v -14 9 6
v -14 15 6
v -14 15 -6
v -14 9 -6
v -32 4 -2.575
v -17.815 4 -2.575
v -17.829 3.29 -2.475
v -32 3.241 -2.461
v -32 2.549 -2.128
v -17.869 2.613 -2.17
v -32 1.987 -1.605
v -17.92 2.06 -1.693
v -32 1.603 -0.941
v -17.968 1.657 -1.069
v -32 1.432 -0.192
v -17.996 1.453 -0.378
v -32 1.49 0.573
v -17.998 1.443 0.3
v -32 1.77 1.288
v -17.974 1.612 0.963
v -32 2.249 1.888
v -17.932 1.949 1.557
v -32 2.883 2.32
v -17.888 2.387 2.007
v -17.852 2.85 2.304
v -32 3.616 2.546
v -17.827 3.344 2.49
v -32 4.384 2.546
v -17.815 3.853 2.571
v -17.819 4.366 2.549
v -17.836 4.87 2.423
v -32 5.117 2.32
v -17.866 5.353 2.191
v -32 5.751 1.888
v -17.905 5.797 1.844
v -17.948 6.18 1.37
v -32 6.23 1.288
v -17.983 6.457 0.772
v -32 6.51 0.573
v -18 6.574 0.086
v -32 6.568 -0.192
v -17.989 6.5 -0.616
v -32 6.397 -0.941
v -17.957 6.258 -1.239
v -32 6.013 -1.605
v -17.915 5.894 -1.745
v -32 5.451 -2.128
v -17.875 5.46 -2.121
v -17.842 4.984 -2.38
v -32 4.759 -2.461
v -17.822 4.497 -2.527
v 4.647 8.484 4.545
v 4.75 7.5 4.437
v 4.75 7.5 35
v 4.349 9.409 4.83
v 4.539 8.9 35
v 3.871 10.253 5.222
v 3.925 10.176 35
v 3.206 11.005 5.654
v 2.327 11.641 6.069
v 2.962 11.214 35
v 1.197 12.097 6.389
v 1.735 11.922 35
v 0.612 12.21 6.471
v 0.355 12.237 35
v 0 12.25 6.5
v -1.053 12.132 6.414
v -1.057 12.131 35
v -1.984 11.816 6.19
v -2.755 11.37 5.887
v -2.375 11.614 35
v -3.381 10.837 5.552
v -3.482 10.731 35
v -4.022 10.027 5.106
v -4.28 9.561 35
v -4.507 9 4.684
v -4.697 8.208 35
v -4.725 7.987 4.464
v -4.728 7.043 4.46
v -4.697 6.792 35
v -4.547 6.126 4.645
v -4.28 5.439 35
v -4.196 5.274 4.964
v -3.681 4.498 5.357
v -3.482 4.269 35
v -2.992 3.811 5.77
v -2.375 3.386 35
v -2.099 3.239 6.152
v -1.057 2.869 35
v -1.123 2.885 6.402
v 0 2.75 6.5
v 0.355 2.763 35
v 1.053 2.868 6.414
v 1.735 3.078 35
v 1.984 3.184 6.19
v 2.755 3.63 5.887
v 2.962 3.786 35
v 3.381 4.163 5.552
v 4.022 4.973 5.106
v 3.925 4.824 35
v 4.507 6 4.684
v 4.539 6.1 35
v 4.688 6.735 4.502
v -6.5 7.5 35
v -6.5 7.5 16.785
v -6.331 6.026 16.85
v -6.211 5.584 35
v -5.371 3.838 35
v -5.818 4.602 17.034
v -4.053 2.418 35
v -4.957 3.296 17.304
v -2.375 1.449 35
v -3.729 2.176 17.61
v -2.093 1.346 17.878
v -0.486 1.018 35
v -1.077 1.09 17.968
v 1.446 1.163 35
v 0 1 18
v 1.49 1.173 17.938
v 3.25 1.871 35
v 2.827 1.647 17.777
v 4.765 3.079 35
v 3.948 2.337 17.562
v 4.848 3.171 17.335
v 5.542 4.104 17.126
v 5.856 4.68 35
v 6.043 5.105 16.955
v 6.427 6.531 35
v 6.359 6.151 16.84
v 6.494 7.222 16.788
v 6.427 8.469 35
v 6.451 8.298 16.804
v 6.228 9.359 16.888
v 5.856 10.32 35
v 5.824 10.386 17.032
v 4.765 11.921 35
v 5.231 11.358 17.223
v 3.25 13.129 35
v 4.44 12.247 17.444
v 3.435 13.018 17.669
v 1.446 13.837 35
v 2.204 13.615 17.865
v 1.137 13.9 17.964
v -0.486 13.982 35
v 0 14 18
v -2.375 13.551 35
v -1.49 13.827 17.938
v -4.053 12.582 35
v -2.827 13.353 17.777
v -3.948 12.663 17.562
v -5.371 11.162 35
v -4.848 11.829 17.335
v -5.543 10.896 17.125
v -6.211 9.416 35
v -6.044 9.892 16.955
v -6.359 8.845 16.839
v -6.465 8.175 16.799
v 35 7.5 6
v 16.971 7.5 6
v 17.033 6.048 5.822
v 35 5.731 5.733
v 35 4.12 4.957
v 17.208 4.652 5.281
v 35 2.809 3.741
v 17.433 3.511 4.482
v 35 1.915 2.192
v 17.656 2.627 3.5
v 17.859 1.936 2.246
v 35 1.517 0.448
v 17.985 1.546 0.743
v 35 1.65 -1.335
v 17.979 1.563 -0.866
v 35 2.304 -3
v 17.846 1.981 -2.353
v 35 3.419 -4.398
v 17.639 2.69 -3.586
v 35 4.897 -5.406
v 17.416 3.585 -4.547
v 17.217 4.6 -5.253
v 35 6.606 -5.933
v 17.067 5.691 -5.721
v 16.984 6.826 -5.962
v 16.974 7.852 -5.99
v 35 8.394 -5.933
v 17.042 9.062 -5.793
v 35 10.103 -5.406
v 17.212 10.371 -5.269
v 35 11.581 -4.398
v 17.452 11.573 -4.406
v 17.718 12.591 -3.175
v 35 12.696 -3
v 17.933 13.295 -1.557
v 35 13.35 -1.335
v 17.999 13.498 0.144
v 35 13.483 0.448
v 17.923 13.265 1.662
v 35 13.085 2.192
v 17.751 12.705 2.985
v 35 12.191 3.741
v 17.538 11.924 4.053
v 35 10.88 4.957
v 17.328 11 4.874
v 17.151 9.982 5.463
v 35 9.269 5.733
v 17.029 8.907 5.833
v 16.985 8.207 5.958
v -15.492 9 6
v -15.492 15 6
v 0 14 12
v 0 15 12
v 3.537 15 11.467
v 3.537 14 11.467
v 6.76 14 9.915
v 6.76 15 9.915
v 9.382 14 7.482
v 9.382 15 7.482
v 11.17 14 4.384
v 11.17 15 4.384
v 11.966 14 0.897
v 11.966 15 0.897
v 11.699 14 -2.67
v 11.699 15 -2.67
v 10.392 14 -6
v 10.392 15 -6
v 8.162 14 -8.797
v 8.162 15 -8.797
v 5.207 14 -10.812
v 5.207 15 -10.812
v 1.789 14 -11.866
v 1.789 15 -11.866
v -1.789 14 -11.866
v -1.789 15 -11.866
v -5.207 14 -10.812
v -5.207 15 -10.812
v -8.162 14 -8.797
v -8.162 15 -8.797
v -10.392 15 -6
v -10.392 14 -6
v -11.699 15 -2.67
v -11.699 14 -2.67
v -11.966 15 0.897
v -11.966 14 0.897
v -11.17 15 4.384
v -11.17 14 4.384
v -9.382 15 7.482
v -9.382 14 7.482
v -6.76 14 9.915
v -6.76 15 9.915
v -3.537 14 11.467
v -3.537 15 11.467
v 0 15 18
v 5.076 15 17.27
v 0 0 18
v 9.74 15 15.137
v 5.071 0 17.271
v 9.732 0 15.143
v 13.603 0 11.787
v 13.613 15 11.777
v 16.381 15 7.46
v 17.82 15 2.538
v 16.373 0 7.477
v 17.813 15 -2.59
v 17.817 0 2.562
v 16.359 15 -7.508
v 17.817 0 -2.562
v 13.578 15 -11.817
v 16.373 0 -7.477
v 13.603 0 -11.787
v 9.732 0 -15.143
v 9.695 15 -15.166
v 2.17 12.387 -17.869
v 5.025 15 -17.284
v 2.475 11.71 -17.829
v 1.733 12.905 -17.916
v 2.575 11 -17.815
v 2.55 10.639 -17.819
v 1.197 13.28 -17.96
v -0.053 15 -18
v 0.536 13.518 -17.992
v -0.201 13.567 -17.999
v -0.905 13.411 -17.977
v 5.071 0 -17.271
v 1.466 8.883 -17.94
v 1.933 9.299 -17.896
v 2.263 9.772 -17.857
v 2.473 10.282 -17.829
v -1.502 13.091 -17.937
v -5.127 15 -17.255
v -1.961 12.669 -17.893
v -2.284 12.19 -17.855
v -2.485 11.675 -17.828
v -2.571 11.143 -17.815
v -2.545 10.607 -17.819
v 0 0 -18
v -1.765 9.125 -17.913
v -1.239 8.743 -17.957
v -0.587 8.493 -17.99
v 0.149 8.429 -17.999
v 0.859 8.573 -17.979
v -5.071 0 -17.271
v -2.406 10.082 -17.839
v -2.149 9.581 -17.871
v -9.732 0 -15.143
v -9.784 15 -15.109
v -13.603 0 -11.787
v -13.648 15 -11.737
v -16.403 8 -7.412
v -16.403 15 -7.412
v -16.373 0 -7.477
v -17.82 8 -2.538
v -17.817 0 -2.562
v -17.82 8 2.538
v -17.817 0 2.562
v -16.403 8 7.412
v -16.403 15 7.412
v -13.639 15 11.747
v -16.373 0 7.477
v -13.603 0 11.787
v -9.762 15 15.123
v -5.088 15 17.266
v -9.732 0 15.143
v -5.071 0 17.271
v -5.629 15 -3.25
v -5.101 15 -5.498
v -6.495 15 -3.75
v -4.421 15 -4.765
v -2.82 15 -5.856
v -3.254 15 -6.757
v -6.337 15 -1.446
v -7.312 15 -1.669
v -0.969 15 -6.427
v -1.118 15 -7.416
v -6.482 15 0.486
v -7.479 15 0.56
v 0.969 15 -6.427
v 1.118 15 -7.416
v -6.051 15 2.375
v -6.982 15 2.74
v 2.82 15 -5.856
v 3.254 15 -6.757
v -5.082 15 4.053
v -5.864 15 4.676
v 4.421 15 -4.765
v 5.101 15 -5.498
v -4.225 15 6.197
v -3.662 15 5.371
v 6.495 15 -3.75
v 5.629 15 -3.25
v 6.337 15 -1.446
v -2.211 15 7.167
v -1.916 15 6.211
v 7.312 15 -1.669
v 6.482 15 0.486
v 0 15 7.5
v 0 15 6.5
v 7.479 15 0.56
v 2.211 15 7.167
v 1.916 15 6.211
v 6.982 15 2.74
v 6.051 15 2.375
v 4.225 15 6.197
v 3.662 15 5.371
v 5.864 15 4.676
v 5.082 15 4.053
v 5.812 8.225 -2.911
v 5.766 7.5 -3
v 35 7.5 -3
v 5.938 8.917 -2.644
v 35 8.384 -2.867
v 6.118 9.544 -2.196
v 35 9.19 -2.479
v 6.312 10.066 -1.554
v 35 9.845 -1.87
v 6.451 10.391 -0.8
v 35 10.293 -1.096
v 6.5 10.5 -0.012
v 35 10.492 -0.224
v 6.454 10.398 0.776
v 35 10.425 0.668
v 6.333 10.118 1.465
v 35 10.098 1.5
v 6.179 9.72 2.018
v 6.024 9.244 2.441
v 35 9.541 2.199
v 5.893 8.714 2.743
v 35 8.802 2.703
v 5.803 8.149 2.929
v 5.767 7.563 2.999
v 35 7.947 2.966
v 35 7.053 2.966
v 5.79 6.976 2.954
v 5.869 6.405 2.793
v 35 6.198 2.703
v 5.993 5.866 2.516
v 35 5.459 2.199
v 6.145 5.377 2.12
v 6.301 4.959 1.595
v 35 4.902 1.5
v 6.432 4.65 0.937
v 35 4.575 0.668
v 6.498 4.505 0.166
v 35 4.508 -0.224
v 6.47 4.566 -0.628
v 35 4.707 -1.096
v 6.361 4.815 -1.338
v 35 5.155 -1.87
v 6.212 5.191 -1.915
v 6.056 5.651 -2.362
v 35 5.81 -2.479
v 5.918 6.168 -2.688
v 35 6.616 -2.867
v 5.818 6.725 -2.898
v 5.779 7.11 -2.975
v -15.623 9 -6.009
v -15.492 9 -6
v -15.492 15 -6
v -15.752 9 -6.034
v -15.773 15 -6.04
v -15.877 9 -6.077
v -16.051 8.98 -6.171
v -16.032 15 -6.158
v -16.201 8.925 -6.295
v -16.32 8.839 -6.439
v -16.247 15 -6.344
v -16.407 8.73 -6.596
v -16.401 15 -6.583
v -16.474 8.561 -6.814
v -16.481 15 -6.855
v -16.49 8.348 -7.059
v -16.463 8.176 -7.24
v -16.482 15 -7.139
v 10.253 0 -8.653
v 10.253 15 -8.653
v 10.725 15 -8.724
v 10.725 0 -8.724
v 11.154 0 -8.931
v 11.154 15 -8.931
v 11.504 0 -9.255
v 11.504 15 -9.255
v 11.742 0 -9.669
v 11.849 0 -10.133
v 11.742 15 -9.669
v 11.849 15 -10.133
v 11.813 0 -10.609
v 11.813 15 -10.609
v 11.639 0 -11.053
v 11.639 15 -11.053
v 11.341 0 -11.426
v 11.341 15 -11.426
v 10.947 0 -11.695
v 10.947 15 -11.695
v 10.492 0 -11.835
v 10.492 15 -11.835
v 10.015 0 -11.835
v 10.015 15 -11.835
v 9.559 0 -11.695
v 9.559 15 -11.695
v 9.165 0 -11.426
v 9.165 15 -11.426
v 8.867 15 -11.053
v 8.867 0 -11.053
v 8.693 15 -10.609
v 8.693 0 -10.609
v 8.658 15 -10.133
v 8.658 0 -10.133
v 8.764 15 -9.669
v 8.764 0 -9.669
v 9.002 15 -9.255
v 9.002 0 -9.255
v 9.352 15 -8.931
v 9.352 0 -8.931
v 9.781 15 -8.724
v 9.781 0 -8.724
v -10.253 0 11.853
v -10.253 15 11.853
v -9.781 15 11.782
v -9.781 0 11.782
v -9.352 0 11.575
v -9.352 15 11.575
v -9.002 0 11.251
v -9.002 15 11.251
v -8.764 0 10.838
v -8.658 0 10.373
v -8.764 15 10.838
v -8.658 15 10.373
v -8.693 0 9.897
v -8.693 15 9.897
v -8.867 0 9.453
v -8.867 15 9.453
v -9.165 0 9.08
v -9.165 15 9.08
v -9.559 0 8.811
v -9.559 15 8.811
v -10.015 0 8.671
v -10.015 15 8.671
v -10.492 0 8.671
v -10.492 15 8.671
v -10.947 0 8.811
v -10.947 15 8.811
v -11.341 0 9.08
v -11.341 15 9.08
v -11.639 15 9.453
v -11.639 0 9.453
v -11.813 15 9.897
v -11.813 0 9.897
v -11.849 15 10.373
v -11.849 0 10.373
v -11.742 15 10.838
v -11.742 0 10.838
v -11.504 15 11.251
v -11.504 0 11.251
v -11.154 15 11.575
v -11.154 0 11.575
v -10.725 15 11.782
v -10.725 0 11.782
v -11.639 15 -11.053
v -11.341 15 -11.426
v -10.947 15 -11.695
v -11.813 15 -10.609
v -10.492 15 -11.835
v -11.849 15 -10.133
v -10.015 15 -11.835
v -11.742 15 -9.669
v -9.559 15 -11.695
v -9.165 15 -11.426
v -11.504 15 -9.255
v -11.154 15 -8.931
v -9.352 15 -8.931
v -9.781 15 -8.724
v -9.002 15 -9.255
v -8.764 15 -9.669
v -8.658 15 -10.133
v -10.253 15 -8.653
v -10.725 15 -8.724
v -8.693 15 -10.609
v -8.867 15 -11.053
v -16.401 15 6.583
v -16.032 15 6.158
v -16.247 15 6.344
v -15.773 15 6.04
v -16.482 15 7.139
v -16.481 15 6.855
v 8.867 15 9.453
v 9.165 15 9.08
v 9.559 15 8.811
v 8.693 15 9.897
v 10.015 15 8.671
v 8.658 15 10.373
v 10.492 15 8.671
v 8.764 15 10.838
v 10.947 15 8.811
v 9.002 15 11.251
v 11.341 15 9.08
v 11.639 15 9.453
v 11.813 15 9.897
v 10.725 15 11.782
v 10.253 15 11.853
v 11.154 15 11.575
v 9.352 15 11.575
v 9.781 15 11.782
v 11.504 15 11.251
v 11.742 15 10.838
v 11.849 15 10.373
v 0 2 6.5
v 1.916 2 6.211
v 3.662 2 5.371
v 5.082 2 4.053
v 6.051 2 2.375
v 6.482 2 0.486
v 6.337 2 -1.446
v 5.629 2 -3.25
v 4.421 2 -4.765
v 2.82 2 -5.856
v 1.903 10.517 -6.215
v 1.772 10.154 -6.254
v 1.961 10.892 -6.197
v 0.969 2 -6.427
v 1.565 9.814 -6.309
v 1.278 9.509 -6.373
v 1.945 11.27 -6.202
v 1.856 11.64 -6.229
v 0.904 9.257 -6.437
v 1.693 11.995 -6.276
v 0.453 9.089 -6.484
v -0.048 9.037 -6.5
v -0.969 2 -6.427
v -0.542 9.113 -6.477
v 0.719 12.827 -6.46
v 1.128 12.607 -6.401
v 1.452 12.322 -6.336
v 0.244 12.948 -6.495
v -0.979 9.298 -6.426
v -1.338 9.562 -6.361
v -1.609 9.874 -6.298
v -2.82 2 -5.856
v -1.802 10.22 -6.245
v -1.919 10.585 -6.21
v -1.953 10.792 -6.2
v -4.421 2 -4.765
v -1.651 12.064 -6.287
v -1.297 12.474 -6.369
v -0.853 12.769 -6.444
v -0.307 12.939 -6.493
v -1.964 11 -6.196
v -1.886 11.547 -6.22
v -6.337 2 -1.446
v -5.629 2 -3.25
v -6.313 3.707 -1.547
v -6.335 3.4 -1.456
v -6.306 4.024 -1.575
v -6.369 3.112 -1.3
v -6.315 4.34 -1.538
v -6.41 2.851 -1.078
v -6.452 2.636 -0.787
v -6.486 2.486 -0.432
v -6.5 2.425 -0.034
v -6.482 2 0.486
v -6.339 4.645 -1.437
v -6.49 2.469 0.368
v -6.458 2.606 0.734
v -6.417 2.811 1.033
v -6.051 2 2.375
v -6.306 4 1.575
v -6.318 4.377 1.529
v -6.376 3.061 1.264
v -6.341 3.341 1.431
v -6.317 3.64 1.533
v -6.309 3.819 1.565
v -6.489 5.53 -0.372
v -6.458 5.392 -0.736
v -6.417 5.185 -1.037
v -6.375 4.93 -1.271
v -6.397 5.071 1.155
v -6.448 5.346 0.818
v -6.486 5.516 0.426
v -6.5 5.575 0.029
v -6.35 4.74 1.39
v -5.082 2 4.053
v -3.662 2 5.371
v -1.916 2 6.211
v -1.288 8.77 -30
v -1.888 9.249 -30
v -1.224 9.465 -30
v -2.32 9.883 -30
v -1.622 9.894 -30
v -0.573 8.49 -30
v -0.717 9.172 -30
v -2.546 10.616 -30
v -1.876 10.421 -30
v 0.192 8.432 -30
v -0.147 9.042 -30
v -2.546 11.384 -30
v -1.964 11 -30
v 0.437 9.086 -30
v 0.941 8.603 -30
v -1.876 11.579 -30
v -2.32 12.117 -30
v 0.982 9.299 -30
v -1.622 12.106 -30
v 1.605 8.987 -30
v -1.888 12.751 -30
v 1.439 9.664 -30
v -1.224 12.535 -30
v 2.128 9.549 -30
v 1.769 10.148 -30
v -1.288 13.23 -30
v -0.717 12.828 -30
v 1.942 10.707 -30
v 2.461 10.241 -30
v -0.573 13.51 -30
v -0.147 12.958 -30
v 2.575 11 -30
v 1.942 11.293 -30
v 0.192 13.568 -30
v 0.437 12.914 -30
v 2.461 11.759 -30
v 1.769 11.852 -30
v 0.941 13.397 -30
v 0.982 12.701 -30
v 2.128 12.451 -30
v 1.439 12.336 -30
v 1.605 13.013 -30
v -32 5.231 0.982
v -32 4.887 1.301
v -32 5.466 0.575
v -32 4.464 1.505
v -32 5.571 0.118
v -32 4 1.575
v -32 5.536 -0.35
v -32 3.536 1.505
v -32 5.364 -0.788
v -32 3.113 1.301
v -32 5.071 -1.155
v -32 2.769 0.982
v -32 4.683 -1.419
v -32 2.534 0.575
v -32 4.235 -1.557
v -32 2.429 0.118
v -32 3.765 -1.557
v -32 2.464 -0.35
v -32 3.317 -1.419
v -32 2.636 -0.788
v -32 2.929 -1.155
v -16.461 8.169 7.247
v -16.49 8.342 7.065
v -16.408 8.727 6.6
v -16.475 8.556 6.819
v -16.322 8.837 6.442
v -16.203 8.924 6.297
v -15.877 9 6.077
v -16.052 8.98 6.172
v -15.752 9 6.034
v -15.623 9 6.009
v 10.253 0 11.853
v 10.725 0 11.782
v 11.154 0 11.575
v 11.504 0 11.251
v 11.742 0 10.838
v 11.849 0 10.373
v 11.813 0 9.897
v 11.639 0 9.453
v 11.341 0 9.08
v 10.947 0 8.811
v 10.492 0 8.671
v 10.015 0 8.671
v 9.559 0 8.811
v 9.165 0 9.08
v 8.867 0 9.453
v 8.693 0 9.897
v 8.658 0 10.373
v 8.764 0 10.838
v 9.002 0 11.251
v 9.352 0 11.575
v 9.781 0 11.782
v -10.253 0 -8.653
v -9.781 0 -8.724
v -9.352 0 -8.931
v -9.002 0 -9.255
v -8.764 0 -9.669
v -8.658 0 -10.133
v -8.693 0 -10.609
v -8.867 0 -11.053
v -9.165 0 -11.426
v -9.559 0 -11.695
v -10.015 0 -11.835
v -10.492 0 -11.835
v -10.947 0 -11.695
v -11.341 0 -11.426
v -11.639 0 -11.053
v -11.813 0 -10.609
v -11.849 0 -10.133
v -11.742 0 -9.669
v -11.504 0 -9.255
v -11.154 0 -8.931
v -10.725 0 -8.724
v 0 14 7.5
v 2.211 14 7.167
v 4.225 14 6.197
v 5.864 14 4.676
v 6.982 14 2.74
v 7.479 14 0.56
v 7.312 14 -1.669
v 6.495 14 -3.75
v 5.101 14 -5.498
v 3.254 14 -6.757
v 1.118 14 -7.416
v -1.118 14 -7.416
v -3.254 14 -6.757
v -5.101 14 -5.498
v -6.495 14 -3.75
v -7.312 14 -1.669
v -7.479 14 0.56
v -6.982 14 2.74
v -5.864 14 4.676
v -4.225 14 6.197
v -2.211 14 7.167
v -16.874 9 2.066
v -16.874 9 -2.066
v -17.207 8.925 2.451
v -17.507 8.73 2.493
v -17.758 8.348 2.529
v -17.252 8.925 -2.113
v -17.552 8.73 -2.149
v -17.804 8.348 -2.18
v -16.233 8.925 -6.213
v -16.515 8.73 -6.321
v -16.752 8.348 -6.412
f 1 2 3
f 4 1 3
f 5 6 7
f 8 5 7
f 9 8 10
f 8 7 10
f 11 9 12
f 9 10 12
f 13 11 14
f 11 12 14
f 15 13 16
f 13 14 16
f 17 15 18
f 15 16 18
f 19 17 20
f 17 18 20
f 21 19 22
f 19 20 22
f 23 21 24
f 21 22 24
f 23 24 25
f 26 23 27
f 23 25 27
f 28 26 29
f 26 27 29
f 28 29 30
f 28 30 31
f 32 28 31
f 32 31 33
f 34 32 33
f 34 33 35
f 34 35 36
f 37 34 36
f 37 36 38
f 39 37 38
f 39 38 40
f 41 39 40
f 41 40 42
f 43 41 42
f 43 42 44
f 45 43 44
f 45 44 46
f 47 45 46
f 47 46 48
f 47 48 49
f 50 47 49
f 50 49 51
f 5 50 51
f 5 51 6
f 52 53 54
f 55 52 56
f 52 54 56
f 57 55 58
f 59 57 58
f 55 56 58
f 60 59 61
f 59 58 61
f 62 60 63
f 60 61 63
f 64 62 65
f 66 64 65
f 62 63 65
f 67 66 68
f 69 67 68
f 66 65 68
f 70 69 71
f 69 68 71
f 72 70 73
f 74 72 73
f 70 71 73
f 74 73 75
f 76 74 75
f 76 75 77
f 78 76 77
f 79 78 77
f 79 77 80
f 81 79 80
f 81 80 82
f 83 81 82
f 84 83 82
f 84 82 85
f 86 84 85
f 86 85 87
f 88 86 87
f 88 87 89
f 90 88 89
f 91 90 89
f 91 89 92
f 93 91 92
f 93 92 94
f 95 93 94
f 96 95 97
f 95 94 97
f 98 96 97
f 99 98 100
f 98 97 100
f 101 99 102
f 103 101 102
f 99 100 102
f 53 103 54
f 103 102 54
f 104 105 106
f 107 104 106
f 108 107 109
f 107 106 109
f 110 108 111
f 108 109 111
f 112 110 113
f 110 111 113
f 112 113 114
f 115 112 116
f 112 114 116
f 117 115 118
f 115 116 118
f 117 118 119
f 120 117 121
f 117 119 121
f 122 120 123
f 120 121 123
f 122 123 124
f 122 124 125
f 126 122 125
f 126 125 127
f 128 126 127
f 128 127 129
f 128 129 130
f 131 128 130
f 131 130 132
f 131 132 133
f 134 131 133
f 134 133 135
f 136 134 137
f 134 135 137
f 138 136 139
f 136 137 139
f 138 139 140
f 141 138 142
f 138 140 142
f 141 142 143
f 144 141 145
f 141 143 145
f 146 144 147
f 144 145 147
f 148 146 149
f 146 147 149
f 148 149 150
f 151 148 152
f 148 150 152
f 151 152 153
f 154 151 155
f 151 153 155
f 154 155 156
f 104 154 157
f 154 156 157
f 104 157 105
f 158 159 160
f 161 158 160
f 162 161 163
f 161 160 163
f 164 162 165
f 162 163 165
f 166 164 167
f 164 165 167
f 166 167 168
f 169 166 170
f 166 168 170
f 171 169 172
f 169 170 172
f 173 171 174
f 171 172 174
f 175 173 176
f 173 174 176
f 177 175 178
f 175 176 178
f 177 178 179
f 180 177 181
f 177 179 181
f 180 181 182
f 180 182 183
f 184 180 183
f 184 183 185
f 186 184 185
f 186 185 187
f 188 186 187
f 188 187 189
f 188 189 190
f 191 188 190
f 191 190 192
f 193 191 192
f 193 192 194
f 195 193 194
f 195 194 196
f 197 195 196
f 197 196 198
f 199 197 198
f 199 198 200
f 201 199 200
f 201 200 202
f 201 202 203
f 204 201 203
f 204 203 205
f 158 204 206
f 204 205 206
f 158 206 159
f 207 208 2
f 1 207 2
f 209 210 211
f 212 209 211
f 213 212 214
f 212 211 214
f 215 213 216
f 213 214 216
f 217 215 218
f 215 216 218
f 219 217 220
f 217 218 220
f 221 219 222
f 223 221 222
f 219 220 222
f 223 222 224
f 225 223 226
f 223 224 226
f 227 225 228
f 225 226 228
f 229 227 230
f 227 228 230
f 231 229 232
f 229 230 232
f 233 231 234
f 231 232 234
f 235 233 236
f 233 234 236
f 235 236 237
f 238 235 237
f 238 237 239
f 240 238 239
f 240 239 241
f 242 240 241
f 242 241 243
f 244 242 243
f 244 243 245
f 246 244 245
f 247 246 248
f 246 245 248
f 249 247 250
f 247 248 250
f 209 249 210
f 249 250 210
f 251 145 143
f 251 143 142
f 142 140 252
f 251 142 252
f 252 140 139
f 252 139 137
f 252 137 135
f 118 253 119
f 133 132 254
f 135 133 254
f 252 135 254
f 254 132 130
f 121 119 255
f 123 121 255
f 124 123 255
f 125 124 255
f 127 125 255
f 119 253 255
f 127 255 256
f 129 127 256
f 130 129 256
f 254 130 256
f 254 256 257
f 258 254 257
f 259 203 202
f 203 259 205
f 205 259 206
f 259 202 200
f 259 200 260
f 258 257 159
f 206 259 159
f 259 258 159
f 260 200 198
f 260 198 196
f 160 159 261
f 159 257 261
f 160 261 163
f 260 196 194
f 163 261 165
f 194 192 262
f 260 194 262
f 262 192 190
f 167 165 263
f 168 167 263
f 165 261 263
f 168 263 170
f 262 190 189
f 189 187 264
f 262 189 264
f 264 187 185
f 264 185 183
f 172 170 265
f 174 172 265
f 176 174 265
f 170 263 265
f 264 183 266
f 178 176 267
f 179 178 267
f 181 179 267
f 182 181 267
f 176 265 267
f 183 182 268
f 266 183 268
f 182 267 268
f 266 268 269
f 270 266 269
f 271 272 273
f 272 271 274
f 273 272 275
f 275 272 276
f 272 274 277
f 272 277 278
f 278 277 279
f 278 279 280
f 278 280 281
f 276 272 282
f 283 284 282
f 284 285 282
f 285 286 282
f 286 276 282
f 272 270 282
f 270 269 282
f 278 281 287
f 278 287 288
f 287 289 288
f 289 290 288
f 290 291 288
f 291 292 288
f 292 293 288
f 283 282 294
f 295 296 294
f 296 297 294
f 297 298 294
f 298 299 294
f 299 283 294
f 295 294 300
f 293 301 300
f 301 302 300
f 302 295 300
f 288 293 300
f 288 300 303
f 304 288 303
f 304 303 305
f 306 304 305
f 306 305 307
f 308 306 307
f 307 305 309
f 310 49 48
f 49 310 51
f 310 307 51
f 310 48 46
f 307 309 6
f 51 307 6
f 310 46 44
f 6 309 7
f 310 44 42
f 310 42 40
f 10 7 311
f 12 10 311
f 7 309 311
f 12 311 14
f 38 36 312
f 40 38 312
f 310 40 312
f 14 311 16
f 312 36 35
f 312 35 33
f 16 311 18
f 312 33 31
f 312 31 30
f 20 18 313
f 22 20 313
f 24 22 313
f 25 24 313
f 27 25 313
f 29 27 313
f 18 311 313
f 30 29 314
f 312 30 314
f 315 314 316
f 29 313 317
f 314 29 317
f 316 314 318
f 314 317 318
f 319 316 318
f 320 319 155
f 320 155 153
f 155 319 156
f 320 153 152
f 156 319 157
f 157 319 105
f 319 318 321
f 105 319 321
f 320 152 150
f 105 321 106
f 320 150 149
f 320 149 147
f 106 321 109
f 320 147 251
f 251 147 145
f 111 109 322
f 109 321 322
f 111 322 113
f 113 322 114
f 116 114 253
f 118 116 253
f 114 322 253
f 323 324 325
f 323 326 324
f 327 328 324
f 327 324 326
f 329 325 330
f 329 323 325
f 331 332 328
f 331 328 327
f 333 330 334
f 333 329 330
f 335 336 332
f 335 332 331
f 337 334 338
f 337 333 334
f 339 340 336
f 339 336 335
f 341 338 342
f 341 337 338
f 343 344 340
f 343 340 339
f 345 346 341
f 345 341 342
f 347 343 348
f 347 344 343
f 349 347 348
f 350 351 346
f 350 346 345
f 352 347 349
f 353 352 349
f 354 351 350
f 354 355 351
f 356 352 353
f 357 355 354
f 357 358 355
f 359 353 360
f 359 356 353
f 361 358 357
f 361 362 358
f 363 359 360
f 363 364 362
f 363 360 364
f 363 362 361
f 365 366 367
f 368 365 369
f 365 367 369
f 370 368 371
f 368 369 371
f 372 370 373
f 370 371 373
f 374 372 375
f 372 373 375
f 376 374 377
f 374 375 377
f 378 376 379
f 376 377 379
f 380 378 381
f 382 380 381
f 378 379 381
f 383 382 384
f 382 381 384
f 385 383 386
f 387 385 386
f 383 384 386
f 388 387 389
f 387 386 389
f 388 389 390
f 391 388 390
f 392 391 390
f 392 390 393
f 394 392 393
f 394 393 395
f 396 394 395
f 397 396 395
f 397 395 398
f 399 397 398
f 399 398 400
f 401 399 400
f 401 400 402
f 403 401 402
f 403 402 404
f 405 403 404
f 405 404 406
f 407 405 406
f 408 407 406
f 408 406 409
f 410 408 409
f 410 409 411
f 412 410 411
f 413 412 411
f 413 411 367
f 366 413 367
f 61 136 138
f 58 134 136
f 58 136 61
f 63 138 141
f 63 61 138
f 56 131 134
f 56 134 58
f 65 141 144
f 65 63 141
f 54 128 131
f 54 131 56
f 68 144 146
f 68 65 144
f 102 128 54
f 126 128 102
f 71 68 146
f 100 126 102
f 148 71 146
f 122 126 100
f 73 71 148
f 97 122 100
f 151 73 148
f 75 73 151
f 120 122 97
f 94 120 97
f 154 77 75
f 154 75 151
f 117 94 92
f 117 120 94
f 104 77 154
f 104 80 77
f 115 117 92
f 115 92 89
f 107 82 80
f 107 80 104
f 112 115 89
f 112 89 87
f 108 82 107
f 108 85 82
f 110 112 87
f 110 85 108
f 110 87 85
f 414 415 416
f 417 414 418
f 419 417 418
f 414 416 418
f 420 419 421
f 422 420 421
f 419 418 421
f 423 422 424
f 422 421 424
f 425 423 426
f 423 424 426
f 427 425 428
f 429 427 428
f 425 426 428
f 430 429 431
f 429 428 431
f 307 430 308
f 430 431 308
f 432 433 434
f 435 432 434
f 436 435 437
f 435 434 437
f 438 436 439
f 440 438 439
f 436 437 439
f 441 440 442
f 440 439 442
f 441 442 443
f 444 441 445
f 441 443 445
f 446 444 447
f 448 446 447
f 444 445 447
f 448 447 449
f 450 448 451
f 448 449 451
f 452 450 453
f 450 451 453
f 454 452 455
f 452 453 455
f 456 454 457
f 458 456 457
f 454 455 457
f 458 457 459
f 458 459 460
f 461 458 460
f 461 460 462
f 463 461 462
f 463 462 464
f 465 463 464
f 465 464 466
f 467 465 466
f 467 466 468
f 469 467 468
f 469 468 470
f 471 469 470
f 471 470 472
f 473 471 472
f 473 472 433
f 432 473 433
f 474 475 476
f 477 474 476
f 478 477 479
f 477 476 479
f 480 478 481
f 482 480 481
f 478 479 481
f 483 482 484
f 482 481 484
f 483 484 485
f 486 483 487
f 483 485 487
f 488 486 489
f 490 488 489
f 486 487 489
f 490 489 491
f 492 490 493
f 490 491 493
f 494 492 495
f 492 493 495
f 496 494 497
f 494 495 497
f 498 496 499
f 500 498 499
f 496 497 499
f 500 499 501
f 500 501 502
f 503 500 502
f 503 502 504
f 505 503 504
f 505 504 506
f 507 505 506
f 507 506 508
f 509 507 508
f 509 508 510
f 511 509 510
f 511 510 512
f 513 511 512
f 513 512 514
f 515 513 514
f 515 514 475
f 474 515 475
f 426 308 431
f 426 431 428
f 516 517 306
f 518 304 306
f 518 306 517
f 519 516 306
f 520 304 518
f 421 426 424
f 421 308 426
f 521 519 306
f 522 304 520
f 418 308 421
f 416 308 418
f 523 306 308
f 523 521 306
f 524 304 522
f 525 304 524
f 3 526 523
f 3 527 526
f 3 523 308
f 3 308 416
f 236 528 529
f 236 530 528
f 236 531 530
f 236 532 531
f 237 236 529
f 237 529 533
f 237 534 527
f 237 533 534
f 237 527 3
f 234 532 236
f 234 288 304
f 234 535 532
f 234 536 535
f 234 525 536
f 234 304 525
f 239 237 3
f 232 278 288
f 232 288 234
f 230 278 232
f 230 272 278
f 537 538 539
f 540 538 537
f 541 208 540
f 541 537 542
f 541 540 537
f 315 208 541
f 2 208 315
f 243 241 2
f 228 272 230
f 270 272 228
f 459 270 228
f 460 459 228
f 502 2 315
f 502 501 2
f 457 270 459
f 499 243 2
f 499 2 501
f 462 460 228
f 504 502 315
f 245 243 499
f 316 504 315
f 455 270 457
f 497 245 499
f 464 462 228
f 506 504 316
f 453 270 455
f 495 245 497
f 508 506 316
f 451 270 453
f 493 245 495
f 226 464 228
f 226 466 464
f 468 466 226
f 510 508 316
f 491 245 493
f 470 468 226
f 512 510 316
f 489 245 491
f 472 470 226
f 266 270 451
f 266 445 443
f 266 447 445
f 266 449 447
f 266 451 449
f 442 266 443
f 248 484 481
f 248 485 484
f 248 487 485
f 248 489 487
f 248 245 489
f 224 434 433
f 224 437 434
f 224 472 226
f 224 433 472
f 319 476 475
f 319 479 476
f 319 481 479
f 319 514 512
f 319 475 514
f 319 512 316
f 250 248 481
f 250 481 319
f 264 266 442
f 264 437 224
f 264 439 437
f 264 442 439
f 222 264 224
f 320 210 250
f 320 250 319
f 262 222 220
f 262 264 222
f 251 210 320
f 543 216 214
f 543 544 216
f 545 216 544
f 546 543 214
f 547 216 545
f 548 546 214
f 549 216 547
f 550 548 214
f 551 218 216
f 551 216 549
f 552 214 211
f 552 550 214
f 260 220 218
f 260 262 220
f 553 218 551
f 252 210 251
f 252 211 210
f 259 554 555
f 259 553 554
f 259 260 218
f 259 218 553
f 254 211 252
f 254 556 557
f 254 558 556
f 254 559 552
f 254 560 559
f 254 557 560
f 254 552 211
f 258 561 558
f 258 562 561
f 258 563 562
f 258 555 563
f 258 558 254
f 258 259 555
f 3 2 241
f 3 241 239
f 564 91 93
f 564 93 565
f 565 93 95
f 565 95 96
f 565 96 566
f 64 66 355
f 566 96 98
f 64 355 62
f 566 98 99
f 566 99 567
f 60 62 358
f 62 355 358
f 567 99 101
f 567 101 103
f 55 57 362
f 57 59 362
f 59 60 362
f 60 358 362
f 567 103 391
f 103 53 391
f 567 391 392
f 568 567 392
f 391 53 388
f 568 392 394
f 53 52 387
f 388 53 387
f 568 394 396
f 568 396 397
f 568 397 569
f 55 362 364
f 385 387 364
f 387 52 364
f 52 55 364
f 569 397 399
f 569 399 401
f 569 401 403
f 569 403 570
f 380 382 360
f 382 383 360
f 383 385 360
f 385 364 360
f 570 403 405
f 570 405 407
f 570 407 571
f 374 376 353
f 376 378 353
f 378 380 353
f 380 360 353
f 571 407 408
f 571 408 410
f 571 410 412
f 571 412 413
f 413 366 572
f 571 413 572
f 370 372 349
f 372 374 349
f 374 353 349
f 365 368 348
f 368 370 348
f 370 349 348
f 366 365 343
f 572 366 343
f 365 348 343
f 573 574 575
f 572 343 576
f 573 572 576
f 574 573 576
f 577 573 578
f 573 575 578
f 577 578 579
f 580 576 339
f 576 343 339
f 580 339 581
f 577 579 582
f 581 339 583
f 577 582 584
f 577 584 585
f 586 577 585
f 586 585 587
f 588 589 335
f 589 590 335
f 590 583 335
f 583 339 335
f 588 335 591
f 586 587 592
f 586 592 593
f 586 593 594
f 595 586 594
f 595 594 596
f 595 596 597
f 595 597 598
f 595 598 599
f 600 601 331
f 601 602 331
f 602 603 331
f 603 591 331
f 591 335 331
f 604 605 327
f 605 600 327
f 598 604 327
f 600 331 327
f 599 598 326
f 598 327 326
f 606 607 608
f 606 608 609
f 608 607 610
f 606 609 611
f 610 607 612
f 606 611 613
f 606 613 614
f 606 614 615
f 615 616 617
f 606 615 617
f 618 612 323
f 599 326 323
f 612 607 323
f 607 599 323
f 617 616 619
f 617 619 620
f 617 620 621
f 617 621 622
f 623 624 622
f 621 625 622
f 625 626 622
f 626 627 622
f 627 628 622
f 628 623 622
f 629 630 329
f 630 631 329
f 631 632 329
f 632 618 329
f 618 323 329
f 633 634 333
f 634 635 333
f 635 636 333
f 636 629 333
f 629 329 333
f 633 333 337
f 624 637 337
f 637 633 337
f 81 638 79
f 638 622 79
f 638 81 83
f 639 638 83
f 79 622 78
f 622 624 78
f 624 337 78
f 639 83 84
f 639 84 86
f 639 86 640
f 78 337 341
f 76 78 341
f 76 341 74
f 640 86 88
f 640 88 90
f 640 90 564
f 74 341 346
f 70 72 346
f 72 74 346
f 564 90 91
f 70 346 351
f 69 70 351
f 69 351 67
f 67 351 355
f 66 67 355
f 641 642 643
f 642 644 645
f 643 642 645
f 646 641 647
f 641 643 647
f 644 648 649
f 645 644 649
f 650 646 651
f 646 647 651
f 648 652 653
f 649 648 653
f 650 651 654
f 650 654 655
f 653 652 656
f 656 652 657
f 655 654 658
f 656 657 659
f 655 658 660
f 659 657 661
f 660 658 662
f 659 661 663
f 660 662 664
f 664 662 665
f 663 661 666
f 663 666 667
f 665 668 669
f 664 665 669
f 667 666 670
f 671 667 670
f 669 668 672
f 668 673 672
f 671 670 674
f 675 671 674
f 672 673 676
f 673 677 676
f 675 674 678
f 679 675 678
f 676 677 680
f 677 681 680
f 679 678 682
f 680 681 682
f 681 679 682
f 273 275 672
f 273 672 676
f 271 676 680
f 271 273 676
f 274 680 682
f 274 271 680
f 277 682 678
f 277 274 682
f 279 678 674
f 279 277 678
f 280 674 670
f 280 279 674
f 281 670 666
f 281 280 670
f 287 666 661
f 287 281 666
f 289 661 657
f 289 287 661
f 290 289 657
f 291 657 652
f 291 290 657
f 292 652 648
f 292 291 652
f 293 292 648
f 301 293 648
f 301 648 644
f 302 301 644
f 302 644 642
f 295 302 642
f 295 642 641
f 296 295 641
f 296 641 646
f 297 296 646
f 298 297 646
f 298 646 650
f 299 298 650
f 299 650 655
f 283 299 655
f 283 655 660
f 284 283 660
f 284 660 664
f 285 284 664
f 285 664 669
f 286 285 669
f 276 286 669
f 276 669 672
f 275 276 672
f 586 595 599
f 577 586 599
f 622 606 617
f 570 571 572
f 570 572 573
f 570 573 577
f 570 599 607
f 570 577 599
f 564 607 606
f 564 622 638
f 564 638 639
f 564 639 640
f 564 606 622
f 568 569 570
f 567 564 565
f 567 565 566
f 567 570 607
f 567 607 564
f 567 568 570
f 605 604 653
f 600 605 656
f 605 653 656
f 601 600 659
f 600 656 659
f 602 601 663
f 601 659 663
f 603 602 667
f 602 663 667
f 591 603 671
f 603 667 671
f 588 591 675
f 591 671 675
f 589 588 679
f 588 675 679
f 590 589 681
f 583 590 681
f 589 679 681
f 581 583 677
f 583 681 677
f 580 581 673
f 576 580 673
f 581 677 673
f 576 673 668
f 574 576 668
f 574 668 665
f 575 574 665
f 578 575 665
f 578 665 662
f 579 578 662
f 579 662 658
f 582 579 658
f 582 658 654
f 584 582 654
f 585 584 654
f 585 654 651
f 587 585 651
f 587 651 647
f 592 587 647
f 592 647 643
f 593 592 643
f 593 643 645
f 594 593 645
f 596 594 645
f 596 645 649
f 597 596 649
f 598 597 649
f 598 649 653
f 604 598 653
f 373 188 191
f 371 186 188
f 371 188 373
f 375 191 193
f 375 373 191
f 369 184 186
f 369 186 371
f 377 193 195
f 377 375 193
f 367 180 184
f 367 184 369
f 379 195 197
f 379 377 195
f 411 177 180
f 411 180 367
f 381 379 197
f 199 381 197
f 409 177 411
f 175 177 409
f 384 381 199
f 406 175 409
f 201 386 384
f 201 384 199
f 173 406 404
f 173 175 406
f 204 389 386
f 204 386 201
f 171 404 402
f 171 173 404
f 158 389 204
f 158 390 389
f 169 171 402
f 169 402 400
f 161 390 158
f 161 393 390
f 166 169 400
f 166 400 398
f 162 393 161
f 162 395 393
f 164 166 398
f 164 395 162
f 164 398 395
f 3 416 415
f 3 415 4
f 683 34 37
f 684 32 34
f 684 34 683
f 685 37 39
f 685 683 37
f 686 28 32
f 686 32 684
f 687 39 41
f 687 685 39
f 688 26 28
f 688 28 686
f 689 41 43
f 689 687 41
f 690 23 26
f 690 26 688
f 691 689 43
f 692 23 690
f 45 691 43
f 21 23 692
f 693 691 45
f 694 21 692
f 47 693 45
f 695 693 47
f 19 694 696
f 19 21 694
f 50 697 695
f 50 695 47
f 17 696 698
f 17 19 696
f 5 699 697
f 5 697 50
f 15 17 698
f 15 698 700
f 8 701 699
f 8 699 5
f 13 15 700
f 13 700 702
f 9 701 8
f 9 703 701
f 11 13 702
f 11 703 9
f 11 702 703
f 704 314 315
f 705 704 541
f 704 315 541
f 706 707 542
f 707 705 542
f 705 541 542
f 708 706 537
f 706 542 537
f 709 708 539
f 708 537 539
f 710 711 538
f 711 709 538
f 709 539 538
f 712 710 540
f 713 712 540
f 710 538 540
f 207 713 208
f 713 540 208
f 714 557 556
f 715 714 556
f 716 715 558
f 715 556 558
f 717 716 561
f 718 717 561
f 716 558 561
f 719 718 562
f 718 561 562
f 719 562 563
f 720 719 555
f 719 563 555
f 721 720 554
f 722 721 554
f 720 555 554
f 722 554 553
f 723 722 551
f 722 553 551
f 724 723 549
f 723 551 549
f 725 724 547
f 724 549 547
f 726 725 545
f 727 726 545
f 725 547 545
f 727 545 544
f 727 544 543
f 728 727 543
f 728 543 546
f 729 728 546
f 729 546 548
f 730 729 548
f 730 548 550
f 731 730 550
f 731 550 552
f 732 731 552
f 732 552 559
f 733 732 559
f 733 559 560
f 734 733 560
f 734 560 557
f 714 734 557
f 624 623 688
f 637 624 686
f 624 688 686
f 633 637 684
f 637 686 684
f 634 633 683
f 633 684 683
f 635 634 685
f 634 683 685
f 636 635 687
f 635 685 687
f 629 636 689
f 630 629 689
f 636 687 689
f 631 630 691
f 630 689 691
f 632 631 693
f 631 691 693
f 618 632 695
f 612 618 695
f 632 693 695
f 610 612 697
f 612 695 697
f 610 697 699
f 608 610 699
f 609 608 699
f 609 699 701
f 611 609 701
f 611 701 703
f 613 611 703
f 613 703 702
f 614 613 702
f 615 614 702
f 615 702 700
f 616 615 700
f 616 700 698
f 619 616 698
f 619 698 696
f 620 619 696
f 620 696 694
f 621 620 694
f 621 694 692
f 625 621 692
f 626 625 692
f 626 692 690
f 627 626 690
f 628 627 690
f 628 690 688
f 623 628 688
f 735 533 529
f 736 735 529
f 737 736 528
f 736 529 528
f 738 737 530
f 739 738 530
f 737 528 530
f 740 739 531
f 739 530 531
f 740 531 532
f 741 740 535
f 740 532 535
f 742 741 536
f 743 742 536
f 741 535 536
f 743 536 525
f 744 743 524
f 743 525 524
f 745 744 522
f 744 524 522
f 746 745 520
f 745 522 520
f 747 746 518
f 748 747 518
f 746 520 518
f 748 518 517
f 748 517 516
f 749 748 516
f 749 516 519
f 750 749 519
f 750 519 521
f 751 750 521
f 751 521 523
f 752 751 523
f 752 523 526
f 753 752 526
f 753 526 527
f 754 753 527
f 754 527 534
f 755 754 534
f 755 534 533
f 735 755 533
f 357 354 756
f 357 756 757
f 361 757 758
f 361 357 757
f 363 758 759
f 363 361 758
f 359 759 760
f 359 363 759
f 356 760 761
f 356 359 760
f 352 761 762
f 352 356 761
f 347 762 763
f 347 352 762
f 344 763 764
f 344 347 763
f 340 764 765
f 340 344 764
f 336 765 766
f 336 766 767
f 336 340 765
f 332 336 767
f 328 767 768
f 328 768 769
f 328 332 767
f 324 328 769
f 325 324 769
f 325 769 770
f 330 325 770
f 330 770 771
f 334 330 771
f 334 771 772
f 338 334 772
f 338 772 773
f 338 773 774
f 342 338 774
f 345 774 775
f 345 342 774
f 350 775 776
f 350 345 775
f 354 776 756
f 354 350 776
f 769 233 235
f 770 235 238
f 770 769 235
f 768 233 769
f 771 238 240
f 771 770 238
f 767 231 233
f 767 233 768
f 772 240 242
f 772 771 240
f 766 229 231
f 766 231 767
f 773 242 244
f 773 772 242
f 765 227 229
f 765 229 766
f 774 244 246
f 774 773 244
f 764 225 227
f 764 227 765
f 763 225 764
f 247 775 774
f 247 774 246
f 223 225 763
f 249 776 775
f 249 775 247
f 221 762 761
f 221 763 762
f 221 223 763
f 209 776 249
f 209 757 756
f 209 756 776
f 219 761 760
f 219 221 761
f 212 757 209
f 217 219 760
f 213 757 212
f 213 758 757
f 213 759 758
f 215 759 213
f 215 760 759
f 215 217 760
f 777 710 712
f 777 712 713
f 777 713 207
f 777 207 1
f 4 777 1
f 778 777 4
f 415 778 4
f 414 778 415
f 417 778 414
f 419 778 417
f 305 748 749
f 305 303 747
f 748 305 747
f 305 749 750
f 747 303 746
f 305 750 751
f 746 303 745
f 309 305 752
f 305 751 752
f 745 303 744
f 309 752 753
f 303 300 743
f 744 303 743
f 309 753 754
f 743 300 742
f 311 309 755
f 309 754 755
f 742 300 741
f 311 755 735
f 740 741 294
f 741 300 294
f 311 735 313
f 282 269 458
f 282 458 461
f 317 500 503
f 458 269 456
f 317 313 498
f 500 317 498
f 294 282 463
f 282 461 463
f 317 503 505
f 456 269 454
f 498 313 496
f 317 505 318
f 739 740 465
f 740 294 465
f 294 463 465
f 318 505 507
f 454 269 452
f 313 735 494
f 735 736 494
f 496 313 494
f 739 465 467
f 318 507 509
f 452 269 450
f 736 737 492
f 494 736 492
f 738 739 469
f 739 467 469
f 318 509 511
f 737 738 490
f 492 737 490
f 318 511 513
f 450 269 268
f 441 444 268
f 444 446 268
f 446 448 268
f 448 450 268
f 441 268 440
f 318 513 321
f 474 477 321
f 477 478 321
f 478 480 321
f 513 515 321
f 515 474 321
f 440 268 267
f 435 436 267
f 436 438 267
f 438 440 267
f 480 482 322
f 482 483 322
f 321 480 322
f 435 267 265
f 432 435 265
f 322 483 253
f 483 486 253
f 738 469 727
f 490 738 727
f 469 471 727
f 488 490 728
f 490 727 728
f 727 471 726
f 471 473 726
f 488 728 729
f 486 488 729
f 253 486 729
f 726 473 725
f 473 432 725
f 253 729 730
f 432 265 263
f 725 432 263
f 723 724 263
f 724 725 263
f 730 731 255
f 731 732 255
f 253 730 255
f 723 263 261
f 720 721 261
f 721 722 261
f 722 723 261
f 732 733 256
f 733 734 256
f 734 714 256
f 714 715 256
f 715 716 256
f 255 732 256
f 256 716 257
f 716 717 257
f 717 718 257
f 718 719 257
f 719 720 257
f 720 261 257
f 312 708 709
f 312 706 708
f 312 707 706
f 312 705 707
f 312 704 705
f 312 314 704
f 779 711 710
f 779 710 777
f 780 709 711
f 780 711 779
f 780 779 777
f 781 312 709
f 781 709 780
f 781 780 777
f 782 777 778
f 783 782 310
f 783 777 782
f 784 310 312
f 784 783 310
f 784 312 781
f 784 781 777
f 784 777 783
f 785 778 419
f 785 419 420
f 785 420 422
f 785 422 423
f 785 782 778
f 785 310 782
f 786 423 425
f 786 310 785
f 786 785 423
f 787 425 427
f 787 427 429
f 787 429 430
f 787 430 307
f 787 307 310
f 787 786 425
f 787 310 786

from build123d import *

# Parameters (mm, degrees)
SKETCH1_R         = 18
BODY_DEPTH        = 15
SKETCH2_R         = 12
SKETCH2_R_2       = 7.5
GASKET_DEPTH      = 1
SKETCH6_R         = 6
CE_PORT_DEPTH     = 35
SKETCH8_W         = 8
SKETCH8_H         = 12
SPE_DEPTH         = 6
SPE_FILLET_R      = 1
SKETCH9_R         = 6.5
RE_PORT_DEPTH     = 35
SKETCH10_R        = 4.75
RE_HOLE_DEPTH     = 35
SKETCH7_R         = 3
CE_HOLE_DEPTH     = 35
SKETCH11_R        = 1.6
BOLTS_DEPTH       = 35
SKETCH13_R        = 2.575
OUTLET_DEPTH      = 30
SKETCH4_R         = 6.5
CELL_VOL_DEPTH    = 13
OUTLET_H_R        = 1.963591437
OUTLET_HOLE_DEPTH = 30
SKETCH15_R        = 2.575
INLET_DEPTH       = 18
SKETCH16_R        = 1.575
INLET_HOLE_DEPTH  = 32


with BuildPart() as part:
    # Sketch1 → Body (new body)
    with BuildSketch(Plane(origin=(0, 0, 0), x_dir=(1, 0, 0), z_dir=(0, 1, 0))):
        with Locations(Location((0, 0, 0), (0, 0, 270))):
            Circle(SKETCH1_R)
    extrude(amount=BODY_DEPTH)

    # Sketch2 → Gasket (cut)
    with BuildSketch(Plane(origin=(0, 15, 0), x_dir=(1, 0, 0), z_dir=(0, 1, 0))):
        with Locations(Location((0, 0, 0), (0, 0, 270))):
            Circle(SKETCH2_R)
        with Locations(Location((0, 0, 0), (0, 0, 270))):
            Circle(SKETCH2_R_2, mode=Mode.SUBTRACT)
    extrude(amount=-GASKET_DEPTH, mode=Mode.SUBTRACT)

    # Sketch6 → CE_port (add)
    with BuildSketch(Plane(origin=(0, 0, 0), x_dir=(0, 0, -1), z_dir=(1, 0, 0))):
        with Locations(Location((0, 7.5, 0), (0, 0, 180))):
            Circle(SKETCH6_R)
    extrude(amount=CE_PORT_DEPTH)

    # Sketch8 → SPE (cut)
    with BuildSketch(Plane(origin=(0, 15, 0), x_dir=(1, 0, 0), z_dir=(0, 1, 0))):
        with Locations((-18, 0)):
            Rectangle(SKETCH8_W, SKETCH8_H)
    extrude(amount=-SPE_DEPTH, mode=Mode.SUBTRACT)

    # SPE_Fillet
    # the kernel refuses this fillet: 1 mm, written as the material it takes off along each edge
    with BuildSketch(Plane(origin=(0, 9, 0), x_dir=(-0.8875777915854841, 0, 0.4606578598962953), z_dir=(0.4606578598962953, 0, 0.8875777915854841))) as spe_fillet_piece_1_section:
        with BuildLine():
            CenterArc((18 - SPE_FILLET_R, SPE_FILLET_R), SPE_FILLET_R, 270, 90)
            Line((18 - SPE_FILLET_R, 0), (18, 0))
            Line((18, 0), (18, SPE_FILLET_R))
        make_face()
    spe_fillet_piece_1 = revolve(axis=Axis((0, 9, 0), (0, -1, 0)), revolution_arc=54.859132299, mode=Mode.PRIVATE)
    spe_fillet_piece_1 = split(spe_fillet_piece_1, bisect_by=Plane(origin=(-17.717440744, 8.717440744, 6), z_dir=(0, 0, -1)), keep=Keep.TOP, mode=Mode.PRIVATE)
    spe_fillet_piece_1 = split(spe_fillet_piece_1, bisect_by=Plane(origin=(-17.717440744, 8.717440744, -6), z_dir=(0, 0, 1)), keep=Keep.TOP, mode=Mode.PRIVATE)
    add(spe_fillet_piece_1, mode=Mode.SUBTRACT)
    with BuildSketch(Plane(origin=(-16.970562748, 18.803742657, -6), x_dir=(0.3728821950274604, 0, -0.9278786928427136), z_dir=(0, -1, 0))) as spe_fillet_piece_2:
        with BuildLine():
            CenterArc((1.479233256, 0.999106486), SPE_FILLET_R, 158.106520097, 114.315739171)
            Line((0.551354563, 1.371988681), (0, 0))
            ThreePointArc((0, 0), (0.760748531, -0.01608325), (1.521497063, 0))
        make_face()
    extrude(amount=9.803742657, mode=Mode.SUBTRACT)
    with BuildSketch(Plane(origin=(-16.970562748, 18.803742657, 6), x_dir=(0.37288219502746, 0, 0.9278786928427138), z_dir=(0, -1, 0))) as spe_fillet_piece_3:
        with BuildLine():
            CenterArc((1.479233256, -0.999106486), SPE_FILLET_R, 87.577740732, 114.315739171)
            Line((0.551354563, -1.371988681), (0, 0))
            ThreePointArc((0, 0), (0.760748531, 0.01608325), (1.521497063, 0))
        make_face()
    extrude(amount=9.803742657, mode=Mode.SUBTRACT)
    with BuildSketch(Plane(origin=(-16.970562748, 18.803742657, 6), x_dir=(0.37288219502746, 0, 0.9278786928427138), z_dir=(0, -1, 0))) as spe_fillet_piece_4a_section:
        with BuildLine():
            CenterArc((1.479233256, -0.999106486), SPE_FILLET_R, 87.577740732, 114.315739171)
            Line((0.551354563, -1.371988681), (0, 0))
            ThreePointArc((0, 0), (0.760748531, 0.01608325), (1.521497063, 0))
        make_face()
    spe_fillet_piece_4a = extrude(amount=13.607485314, mode=Mode.PRIVATE)
    spe_fillet_piece_4a = split(spe_fillet_piece_4a, bisect_by=Plane(origin=(-16.491409341, 9, 6.340012755), z_dir=(0, -1, 0)), keep=Keep.TOP, mode=Mode.PRIVATE)
    with BuildSketch(Plane(origin=(0, 9, 0), x_dir=(-0.8875777915854841, 0, 0.4606578598962953), z_dir=(0.4606578598962953, 0, 0.8875777915854841))) as spe_fillet_piece_4b_section:
        with BuildLine():
            CenterArc((18 - SPE_FILLET_R, SPE_FILLET_R), SPE_FILLET_R, 270, 90)
            Line((18 - SPE_FILLET_R, 0), (18, 0))
            Line((18, 0), (18, SPE_FILLET_R))
        make_face()
    spe_fillet_piece_4b = revolve(axis=Axis((0, 9, 0), (0, -1, 0)), revolution_arc=54.859132299, mode=Mode.PRIVATE)
    spe_fillet_piece_4b = split(spe_fillet_piece_4b, bisect_by=Plane(origin=(-16.286739391, 8.767935426, 6), z_dir=(0, 0, 1)), keep=Keep.TOP, mode=Mode.PRIVATE)
    spe_fillet_piece_4 = spe_fillet_piece_4a & spe_fillet_piece_4b
    add(spe_fillet_piece_4, mode=Mode.SUBTRACT)
    with BuildSketch(Plane(origin=(0, 9, 0), x_dir=(-0.8875777915854841, 0, 0.4606578598962953), z_dir=(0.4606578598962953, 0, 0.8875777915854841))) as spe_fillet_piece_5a_section:
        with BuildLine():
            CenterArc((18 - SPE_FILLET_R, SPE_FILLET_R), SPE_FILLET_R, 270, 90)
            Line((18 - SPE_FILLET_R, 0), (18, 0))
            Line((18, 0), (18, SPE_FILLET_R))
        make_face()
    spe_fillet_piece_5a = revolve(axis=Axis((0, 9, 0), (0, -1, 0)), revolution_arc=54.859132299, mode=Mode.PRIVATE)
    spe_fillet_piece_5a = split(spe_fillet_piece_5a, bisect_by=Plane(origin=(-16.286739653, 8.767935416, -6), z_dir=(0, 0, -1)), keep=Keep.TOP, mode=Mode.PRIVATE)
    with BuildSketch(Plane(origin=(-16.970562748, 18.803742657, -6), x_dir=(0.3728821950274604, 0, -0.9278786928427136), z_dir=(0, -1, 0))) as spe_fillet_piece_5b_section:
        with BuildLine():
            CenterArc((1.479233256, 0.999106486), SPE_FILLET_R, 158.106520097, 114.315739171)
            Line((0.551354563, 1.371988681), (0, 0))
            ThreePointArc((0, 0), (0.760748531, -0.01608325), (1.521497063, 0))
        make_face()
    spe_fillet_piece_5b = extrude(amount=13.607485314, mode=Mode.PRIVATE)
    spe_fillet_piece_5b = split(spe_fillet_piece_5b, bisect_by=Plane(origin=(-16.491409341, 9, -6.340012755), z_dir=(0, -1, 0)), keep=Keep.TOP, mode=Mode.PRIVATE)
    spe_fillet_piece_5 = spe_fillet_piece_5a & spe_fillet_piece_5b
    add(spe_fillet_piece_5, mode=Mode.SUBTRACT)

    # Sketch9 → RE_port (add)
    with BuildSketch(Plane.XY):
        with Locations(Location((0, 7.5, 0), (0, 0, 180))):
            Circle(SKETCH9_R)
    extrude(amount=RE_PORT_DEPTH)

    # Sketch10 → RE_hole (cut)
    with BuildSketch(Plane.XY.offset(35)):
        with Locations((0, 7.5)):
            Circle(SKETCH10_R)
    extrude(amount=-RE_HOLE_DEPTH, mode=Mode.SUBTRACT)

    # Sketch7 → CE_hole (cut)
    with BuildSketch(Plane(origin=(35, 0, 0), x_dir=(0, 0, -1), z_dir=(1, 0, 0))):
        with Locations((0, 7.5)):
            Circle(SKETCH7_R)
    extrude(amount=-CE_HOLE_DEPTH, mode=Mode.SUBTRACT)

    # Sketch11 → Bolts (cut)
    with BuildSketch(Plane(origin=(0, 15, 0), x_dir=(1, 0, 0), z_dir=(0, 1, 0))):
        with Locations(Location((-10.253048327, 10.253048327, 0), (0, 0, 270))):
            Circle(SKETCH11_R)
        with Locations(Location((10.253048327, 10.253048327, 0), (0, 0, 270))):
            Circle(SKETCH11_R)
        with Locations(Location((10.253048327, -10.253048327, 0), (0, 0, 270))):
            Circle(SKETCH11_R)
        with Locations(Location((-10.253048327, -10.253048327, 0), (0, 0, 270))):
            Circle(SKETCH11_R)
    extrude(amount=-BOLTS_DEPTH, mode=Mode.SUBTRACT)

    # Sketch13 → Outlet (add)
    with BuildSketch(Plane.XY):
        with Locations((0, 11)):
            Circle(SKETCH13_R)
    extrude(amount=-OUTLET_DEPTH)

    # Sketch4 → Cell_vol (cut)
    with BuildSketch(Plane(origin=(0, 15, 0), x_dir=(1, 0, 0), z_dir=(0, 1, 0))):
        with Locations(Location((0, 0, 0), (0, 0, 270))):
            Circle(SKETCH4_R)
    extrude(amount=-CELL_VOL_DEPTH, mode=Mode.SUBTRACT)

    # Outlet_h → Outlet_hole (cut)
    with BuildSketch(Plane(origin=(0, 0, -30), x_dir=(-1, 0, 0), z_dir=(0, 0, -1))):
        with Locations((0, 11)):
            Circle(OUTLET_H_R)
    extrude(amount=-OUTLET_HOLE_DEPTH, mode=Mode.SUBTRACT)

    # Sketch15 → Inlet (add)
    with BuildSketch(Plane.ZY.offset(14)):
        with Locations(Location((0, 4, 0), (0, 0, 180))):
            Circle(SKETCH15_R)
    extrude(amount=INLET_DEPTH)

    # Sketch16 → Inlet_hole (cut)
    with BuildSketch(Plane.ZY.offset(32)):
        with Locations((0, 4)):
            Circle(SKETCH16_R)
    extrude(amount=-INLET_HOLE_DEPTH, mode=Mode.SUBTRACT)


solid = part.part
